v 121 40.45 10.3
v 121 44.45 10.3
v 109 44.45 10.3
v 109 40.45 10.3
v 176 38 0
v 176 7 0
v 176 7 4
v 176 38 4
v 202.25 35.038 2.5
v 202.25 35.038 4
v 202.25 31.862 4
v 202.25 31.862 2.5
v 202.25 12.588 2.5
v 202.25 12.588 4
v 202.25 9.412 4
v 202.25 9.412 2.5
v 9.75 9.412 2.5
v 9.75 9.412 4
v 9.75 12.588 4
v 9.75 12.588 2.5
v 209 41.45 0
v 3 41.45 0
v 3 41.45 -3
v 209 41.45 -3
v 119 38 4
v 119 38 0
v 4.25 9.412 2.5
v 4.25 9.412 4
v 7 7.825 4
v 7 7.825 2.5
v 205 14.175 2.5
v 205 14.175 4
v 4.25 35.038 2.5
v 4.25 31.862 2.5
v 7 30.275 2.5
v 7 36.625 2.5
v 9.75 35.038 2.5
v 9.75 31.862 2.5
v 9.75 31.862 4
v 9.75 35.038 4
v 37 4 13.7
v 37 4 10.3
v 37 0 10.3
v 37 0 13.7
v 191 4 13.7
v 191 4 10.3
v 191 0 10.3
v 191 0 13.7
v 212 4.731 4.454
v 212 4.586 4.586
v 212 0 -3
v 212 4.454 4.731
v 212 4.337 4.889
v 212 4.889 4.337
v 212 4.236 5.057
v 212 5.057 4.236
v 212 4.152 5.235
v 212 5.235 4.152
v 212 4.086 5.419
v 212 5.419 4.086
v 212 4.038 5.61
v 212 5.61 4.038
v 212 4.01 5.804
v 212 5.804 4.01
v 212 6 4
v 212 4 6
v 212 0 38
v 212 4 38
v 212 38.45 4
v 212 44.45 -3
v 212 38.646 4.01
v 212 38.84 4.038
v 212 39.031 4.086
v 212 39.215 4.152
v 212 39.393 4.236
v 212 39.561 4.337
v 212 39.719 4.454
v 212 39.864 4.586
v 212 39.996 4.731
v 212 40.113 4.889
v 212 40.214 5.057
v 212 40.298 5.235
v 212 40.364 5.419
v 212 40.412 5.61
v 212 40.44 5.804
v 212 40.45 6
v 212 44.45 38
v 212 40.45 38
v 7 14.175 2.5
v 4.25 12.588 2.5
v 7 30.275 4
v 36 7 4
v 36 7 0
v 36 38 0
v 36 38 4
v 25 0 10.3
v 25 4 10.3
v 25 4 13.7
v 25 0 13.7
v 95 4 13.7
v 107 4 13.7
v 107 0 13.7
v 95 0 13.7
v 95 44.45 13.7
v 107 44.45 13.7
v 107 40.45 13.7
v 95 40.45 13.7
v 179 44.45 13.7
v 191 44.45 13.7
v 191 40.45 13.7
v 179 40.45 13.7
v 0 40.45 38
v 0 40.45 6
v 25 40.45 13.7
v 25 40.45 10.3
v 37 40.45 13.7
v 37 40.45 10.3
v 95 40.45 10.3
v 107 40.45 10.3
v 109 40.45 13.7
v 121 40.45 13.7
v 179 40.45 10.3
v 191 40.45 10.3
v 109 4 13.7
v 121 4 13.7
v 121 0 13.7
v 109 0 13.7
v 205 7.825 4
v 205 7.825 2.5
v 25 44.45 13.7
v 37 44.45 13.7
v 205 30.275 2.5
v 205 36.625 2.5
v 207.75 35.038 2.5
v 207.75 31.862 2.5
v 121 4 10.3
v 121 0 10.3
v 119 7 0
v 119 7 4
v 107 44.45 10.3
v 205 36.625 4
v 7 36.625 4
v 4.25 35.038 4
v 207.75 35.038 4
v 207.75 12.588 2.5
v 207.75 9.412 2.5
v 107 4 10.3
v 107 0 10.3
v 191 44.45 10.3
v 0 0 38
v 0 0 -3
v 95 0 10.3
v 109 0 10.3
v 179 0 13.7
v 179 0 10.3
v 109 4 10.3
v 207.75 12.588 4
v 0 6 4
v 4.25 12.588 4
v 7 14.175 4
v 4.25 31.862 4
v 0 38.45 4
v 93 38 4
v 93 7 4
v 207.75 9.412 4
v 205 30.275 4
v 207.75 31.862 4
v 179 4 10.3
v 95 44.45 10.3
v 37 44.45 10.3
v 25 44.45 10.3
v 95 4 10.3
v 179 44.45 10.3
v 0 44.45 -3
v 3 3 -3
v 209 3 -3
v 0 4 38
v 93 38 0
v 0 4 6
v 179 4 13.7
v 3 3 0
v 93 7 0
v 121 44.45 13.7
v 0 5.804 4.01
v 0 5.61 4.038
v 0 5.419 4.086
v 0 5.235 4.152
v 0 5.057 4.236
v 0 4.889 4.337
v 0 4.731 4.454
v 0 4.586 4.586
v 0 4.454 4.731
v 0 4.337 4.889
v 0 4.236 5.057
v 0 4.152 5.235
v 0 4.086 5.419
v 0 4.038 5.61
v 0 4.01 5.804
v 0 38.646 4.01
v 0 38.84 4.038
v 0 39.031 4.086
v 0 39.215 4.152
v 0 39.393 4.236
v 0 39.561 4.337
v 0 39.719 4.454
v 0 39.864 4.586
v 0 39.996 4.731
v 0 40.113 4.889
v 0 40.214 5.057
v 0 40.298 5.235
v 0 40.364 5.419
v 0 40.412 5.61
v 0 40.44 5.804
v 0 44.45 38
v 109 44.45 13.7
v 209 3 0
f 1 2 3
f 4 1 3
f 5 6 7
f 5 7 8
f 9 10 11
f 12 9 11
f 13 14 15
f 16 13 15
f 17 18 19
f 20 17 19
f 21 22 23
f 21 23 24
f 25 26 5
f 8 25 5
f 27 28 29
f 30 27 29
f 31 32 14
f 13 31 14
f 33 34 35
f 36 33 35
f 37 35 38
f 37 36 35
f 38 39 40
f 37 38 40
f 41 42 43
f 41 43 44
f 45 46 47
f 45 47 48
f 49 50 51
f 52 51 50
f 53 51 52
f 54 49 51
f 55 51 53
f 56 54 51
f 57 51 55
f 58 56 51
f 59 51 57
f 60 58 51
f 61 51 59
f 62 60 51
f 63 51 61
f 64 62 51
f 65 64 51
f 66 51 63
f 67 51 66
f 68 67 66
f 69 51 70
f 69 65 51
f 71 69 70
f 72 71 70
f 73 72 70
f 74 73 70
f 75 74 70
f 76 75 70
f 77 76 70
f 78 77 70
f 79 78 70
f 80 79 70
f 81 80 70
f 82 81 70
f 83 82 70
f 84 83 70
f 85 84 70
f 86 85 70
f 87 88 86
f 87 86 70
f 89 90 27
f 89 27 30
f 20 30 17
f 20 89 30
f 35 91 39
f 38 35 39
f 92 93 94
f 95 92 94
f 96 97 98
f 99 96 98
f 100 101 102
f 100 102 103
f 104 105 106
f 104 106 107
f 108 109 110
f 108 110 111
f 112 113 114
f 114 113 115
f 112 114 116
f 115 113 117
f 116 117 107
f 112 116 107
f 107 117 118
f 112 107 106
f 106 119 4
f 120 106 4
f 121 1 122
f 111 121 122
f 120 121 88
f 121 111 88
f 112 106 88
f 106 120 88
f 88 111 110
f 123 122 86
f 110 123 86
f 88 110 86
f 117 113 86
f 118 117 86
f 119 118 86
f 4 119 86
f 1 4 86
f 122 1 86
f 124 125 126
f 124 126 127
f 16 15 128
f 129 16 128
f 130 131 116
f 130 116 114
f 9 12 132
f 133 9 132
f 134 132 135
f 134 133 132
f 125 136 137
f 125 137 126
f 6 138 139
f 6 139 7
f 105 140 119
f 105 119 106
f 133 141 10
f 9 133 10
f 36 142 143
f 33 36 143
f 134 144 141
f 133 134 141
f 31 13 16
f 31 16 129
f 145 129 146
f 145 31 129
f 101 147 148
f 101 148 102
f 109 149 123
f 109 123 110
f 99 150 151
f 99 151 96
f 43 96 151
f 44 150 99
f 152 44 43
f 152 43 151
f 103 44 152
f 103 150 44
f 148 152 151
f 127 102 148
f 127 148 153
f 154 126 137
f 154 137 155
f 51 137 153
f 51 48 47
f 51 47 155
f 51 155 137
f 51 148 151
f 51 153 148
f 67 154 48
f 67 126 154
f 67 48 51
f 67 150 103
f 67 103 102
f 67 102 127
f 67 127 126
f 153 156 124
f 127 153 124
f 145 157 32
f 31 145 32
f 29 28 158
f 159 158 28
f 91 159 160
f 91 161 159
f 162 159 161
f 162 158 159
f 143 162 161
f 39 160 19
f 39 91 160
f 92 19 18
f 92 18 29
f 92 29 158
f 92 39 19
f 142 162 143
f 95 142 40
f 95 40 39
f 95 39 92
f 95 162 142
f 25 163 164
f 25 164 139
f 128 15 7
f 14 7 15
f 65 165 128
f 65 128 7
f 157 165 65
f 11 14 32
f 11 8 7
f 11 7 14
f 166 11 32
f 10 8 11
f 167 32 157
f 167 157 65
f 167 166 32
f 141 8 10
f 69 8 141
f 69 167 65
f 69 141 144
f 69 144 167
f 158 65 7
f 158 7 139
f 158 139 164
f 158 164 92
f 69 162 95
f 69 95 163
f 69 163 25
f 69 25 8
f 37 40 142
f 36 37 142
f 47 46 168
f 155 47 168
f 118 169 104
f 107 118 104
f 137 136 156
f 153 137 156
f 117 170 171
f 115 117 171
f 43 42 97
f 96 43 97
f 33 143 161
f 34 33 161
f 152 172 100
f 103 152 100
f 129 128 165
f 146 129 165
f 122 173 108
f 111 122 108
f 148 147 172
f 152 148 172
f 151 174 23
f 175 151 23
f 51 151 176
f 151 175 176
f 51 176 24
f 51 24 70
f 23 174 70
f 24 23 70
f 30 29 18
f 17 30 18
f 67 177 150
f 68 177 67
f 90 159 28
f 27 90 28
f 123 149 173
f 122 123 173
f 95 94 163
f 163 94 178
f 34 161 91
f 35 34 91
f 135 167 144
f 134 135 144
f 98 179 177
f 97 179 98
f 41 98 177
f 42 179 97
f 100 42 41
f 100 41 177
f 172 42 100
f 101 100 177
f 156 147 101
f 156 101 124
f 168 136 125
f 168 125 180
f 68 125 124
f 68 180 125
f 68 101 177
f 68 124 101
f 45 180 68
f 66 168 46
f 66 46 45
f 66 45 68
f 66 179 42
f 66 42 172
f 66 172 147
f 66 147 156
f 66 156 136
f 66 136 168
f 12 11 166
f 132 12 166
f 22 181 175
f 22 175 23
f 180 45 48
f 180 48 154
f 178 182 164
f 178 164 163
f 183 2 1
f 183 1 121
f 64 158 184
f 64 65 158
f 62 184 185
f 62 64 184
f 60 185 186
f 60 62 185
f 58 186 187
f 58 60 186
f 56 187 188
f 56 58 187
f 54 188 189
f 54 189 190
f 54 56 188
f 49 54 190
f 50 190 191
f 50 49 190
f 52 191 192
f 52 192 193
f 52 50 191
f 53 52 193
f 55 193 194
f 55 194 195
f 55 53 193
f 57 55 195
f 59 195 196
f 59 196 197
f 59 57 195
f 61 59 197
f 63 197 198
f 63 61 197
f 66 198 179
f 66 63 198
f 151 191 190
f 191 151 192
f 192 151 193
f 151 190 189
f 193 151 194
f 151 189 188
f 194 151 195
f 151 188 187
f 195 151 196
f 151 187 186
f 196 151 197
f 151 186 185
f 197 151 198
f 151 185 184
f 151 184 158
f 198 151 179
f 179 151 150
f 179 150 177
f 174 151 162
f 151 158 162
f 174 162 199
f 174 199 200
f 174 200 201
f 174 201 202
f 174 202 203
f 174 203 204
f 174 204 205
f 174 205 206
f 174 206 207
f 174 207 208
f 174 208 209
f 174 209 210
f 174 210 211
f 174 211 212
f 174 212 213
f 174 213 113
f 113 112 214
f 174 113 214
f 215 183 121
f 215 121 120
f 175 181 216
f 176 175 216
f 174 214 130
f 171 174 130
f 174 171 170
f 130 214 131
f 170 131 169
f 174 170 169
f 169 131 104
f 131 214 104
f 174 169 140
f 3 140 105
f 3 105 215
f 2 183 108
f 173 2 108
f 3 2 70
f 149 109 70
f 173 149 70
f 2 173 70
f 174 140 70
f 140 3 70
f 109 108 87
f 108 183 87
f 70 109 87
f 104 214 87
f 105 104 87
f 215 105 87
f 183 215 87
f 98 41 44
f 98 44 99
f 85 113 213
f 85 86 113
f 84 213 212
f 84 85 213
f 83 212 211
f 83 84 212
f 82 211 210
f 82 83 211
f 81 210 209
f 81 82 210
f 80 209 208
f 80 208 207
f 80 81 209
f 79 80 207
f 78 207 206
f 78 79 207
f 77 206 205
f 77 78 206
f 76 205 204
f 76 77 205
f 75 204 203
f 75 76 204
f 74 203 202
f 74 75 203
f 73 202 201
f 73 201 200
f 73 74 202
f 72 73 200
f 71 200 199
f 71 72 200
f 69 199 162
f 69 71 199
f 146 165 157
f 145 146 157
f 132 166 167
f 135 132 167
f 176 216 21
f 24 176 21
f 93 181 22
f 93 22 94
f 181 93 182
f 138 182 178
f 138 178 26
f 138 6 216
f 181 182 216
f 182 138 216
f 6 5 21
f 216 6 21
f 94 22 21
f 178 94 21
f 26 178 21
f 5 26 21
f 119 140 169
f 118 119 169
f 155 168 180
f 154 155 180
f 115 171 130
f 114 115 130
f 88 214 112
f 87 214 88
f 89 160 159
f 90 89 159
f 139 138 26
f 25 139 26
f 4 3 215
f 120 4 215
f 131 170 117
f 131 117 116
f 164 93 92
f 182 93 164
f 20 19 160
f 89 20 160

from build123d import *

# Parameters (mm, degrees)
FACEPLATESKETCH_W      = 212
FACEPLATESKETCH_H      = 44.45
FACEPLATEPAD_DEPTH     = 4
BOTTOMWALLSKETCH_W     = 212
BOTTOMWALLSKETCH_H     = 4
BOTTOMWALLPAD_DEPTH    = 34
TOPWALLSKETCH_W        = 212
TOPWALLSKETCH_H        = 4
TOPWALLPAD_DEPTH       = 34
LIPBLOCKSKETCH_W       = 212
LIPBLOCKSKETCH_H       = 44.45
LIPBLOCKPAD_DEPTH      = 3
LIPPOCKETSKETCH_W      = 206
LIPPOCKETSKETCH_H      = 38.45
LIPPOCKET_DEPTH        = 3
JOINTHOLESSKETCH_R     = 1.6
JOINTHOLESPOCKET_DEPTH = 3.001
NUTRECESSPOCKET_DEPTH  = 1.5
BOXCUTOUTSKETCH_W      = 57
BOXCUTOUTSKETCH_H      = 31
BOXCUTOUTPOCKET_DEPTH  = 38.001
WALLFILLETS_R          = 2
TOPSLOTSKETCH_W        = 12
TOPSLOTSKETCH_H        = 3.4
TOPSLOTPOCKET_DEPTH    = 44.451


with BuildPart() as part:
    # FacePlateSketch → FacePlatePad (new body)
    with BuildSketch(Plane.XY):
        with Locations((106, 22.225)):
            Rectangle(FACEPLATESKETCH_W, FACEPLATESKETCH_H)
    extrude(amount=FACEPLATEPAD_DEPTH)

    # BottomWallSketch (on Face6 of FacePlatePad) → BottomWallPad (join)
    with BuildSketch(Plane.XY.offset(4)):
        with Locations((106, 2)):
            Rectangle(BOTTOMWALLSKETCH_W, BOTTOMWALLSKETCH_H)
    extrude(amount=BOTTOMWALLPAD_DEPTH)

    # TopWallSketch (on Face6 of FacePlatePad) → TopWallPad (join)
    with BuildSketch(Plane.XY.offset(4)):
        with Locations((106, 42.45)):
            Rectangle(TOPWALLSKETCH_W, TOPWALLSKETCH_H)
    extrude(amount=TOPWALLPAD_DEPTH)

    # LipBlockSketch → LipBlockPad (join)
    with BuildSketch(Plane.XY):
        with Locations((106, 22.225)):
            Rectangle(LIPBLOCKSKETCH_W, LIPBLOCKSKETCH_H)
    extrude(amount=-LIPBLOCKPAD_DEPTH)

    # LipPocketSketch → LipPocket (cut)
    with BuildSketch(Plane.XY):
        with Locations((106, 22.225)):
            Rectangle(LIPPOCKETSKETCH_W, LIPPOCKETSKETCH_H)
    extrude(amount=-LIPPOCKET_DEPTH, mode=Mode.SUBTRACT)

    # JointHolesSketch → JointHolesPocket (cut, through all)
    with BuildSketch(Plane.XY):
        with Locations((7, 11)):
            Circle(JOINTHOLESSKETCH_R)
        with Locations((205, 11)):
            Circle(JOINTHOLESSKETCH_R)
        with Locations((7, 33.45)):
            Circle(JOINTHOLESSKETCH_R)
        with Locations((205, 33.45)):
            Circle(JOINTHOLESSKETCH_R)
    extrude(amount=-JOINTHOLESPOCKET_DEPTH, mode=Mode.SUBTRACT)

    # NutRecessSketch (on Face6 of FacePlatePad) → NutRecessPocket (cut)
    with BuildSketch(Plane.XY.offset(4)):
        Polygon((9.75, 12.587713), (7, 14.175426), (4.25, 12.587713), (4.25, 9.412287), (7, 7.824574), (9.75, 9.412287), align=None)
        Polygon((207.75, 12.587713), (205, 14.175426), (202.25, 12.587713), (202.25, 9.412287), (205, 7.824574), (207.75, 9.412287), align=None)
        Polygon((9.75, 35.037713), (7, 36.625426), (4.25, 35.037713), (4.25, 31.862287), (7, 30.274574), (9.75, 31.862287), align=None)
        Polygon((207.75, 35.037713), (205, 36.625426), (202.25, 35.037713), (202.25, 31.862287), (205, 30.274574), (207.75, 31.862287), align=None)
    extrude(amount=-NUTRECESSPOCKET_DEPTH, mode=Mode.SUBTRACT)

    # BoxCutoutSketch → BoxCutoutPocket (cut, through all)
    with BuildSketch(Plane.XY):
        with Locations((64.5, 22.5)):
            Rectangle(BOXCUTOUTSKETCH_W, BOXCUTOUTSKETCH_H)
        with Locations((147.5, 22.5)):
            Rectangle(BOXCUTOUTSKETCH_W, BOXCUTOUTSKETCH_H)
    extrude(amount=BOXCUTOUTPOCKET_DEPTH, mode=Mode.SUBTRACT)

    # WallFillets
    wallfillets_edges = [part.edges().sort_by_distance(p)[0] for p in [
        (106, 4, 4),
        (106, 40.45, 4),
    ]]
    fillet(wallfillets_edges, radius=WALLFILLETS_R)

    # TopSlotSketch (on Face10 of WallFillets) → TopSlotPocket (cut, through all)
    with BuildSketch(Plane(origin=(0, 44.45, 0), x_dir=(-1, 0, 0), z_dir=(0, 1, 0))):
        with Locations((-31, 12)):
            Rectangle(TOPSLOTSKETCH_W, TOPSLOTSKETCH_H)
        with Locations((-101, 12)):
            Rectangle(TOPSLOTSKETCH_W, TOPSLOTSKETCH_H)
        with Locations((-115, 12)):
            Rectangle(TOPSLOTSKETCH_W, TOPSLOTSKETCH_H)
        with Locations((-185, 12)):
            Rectangle(TOPSLOTSKETCH_W, TOPSLOTSKETCH_H)
    extrude(amount=-TOPSLOTPOCKET_DEPTH, mode=Mode.SUBTRACT)


solid = part.part
